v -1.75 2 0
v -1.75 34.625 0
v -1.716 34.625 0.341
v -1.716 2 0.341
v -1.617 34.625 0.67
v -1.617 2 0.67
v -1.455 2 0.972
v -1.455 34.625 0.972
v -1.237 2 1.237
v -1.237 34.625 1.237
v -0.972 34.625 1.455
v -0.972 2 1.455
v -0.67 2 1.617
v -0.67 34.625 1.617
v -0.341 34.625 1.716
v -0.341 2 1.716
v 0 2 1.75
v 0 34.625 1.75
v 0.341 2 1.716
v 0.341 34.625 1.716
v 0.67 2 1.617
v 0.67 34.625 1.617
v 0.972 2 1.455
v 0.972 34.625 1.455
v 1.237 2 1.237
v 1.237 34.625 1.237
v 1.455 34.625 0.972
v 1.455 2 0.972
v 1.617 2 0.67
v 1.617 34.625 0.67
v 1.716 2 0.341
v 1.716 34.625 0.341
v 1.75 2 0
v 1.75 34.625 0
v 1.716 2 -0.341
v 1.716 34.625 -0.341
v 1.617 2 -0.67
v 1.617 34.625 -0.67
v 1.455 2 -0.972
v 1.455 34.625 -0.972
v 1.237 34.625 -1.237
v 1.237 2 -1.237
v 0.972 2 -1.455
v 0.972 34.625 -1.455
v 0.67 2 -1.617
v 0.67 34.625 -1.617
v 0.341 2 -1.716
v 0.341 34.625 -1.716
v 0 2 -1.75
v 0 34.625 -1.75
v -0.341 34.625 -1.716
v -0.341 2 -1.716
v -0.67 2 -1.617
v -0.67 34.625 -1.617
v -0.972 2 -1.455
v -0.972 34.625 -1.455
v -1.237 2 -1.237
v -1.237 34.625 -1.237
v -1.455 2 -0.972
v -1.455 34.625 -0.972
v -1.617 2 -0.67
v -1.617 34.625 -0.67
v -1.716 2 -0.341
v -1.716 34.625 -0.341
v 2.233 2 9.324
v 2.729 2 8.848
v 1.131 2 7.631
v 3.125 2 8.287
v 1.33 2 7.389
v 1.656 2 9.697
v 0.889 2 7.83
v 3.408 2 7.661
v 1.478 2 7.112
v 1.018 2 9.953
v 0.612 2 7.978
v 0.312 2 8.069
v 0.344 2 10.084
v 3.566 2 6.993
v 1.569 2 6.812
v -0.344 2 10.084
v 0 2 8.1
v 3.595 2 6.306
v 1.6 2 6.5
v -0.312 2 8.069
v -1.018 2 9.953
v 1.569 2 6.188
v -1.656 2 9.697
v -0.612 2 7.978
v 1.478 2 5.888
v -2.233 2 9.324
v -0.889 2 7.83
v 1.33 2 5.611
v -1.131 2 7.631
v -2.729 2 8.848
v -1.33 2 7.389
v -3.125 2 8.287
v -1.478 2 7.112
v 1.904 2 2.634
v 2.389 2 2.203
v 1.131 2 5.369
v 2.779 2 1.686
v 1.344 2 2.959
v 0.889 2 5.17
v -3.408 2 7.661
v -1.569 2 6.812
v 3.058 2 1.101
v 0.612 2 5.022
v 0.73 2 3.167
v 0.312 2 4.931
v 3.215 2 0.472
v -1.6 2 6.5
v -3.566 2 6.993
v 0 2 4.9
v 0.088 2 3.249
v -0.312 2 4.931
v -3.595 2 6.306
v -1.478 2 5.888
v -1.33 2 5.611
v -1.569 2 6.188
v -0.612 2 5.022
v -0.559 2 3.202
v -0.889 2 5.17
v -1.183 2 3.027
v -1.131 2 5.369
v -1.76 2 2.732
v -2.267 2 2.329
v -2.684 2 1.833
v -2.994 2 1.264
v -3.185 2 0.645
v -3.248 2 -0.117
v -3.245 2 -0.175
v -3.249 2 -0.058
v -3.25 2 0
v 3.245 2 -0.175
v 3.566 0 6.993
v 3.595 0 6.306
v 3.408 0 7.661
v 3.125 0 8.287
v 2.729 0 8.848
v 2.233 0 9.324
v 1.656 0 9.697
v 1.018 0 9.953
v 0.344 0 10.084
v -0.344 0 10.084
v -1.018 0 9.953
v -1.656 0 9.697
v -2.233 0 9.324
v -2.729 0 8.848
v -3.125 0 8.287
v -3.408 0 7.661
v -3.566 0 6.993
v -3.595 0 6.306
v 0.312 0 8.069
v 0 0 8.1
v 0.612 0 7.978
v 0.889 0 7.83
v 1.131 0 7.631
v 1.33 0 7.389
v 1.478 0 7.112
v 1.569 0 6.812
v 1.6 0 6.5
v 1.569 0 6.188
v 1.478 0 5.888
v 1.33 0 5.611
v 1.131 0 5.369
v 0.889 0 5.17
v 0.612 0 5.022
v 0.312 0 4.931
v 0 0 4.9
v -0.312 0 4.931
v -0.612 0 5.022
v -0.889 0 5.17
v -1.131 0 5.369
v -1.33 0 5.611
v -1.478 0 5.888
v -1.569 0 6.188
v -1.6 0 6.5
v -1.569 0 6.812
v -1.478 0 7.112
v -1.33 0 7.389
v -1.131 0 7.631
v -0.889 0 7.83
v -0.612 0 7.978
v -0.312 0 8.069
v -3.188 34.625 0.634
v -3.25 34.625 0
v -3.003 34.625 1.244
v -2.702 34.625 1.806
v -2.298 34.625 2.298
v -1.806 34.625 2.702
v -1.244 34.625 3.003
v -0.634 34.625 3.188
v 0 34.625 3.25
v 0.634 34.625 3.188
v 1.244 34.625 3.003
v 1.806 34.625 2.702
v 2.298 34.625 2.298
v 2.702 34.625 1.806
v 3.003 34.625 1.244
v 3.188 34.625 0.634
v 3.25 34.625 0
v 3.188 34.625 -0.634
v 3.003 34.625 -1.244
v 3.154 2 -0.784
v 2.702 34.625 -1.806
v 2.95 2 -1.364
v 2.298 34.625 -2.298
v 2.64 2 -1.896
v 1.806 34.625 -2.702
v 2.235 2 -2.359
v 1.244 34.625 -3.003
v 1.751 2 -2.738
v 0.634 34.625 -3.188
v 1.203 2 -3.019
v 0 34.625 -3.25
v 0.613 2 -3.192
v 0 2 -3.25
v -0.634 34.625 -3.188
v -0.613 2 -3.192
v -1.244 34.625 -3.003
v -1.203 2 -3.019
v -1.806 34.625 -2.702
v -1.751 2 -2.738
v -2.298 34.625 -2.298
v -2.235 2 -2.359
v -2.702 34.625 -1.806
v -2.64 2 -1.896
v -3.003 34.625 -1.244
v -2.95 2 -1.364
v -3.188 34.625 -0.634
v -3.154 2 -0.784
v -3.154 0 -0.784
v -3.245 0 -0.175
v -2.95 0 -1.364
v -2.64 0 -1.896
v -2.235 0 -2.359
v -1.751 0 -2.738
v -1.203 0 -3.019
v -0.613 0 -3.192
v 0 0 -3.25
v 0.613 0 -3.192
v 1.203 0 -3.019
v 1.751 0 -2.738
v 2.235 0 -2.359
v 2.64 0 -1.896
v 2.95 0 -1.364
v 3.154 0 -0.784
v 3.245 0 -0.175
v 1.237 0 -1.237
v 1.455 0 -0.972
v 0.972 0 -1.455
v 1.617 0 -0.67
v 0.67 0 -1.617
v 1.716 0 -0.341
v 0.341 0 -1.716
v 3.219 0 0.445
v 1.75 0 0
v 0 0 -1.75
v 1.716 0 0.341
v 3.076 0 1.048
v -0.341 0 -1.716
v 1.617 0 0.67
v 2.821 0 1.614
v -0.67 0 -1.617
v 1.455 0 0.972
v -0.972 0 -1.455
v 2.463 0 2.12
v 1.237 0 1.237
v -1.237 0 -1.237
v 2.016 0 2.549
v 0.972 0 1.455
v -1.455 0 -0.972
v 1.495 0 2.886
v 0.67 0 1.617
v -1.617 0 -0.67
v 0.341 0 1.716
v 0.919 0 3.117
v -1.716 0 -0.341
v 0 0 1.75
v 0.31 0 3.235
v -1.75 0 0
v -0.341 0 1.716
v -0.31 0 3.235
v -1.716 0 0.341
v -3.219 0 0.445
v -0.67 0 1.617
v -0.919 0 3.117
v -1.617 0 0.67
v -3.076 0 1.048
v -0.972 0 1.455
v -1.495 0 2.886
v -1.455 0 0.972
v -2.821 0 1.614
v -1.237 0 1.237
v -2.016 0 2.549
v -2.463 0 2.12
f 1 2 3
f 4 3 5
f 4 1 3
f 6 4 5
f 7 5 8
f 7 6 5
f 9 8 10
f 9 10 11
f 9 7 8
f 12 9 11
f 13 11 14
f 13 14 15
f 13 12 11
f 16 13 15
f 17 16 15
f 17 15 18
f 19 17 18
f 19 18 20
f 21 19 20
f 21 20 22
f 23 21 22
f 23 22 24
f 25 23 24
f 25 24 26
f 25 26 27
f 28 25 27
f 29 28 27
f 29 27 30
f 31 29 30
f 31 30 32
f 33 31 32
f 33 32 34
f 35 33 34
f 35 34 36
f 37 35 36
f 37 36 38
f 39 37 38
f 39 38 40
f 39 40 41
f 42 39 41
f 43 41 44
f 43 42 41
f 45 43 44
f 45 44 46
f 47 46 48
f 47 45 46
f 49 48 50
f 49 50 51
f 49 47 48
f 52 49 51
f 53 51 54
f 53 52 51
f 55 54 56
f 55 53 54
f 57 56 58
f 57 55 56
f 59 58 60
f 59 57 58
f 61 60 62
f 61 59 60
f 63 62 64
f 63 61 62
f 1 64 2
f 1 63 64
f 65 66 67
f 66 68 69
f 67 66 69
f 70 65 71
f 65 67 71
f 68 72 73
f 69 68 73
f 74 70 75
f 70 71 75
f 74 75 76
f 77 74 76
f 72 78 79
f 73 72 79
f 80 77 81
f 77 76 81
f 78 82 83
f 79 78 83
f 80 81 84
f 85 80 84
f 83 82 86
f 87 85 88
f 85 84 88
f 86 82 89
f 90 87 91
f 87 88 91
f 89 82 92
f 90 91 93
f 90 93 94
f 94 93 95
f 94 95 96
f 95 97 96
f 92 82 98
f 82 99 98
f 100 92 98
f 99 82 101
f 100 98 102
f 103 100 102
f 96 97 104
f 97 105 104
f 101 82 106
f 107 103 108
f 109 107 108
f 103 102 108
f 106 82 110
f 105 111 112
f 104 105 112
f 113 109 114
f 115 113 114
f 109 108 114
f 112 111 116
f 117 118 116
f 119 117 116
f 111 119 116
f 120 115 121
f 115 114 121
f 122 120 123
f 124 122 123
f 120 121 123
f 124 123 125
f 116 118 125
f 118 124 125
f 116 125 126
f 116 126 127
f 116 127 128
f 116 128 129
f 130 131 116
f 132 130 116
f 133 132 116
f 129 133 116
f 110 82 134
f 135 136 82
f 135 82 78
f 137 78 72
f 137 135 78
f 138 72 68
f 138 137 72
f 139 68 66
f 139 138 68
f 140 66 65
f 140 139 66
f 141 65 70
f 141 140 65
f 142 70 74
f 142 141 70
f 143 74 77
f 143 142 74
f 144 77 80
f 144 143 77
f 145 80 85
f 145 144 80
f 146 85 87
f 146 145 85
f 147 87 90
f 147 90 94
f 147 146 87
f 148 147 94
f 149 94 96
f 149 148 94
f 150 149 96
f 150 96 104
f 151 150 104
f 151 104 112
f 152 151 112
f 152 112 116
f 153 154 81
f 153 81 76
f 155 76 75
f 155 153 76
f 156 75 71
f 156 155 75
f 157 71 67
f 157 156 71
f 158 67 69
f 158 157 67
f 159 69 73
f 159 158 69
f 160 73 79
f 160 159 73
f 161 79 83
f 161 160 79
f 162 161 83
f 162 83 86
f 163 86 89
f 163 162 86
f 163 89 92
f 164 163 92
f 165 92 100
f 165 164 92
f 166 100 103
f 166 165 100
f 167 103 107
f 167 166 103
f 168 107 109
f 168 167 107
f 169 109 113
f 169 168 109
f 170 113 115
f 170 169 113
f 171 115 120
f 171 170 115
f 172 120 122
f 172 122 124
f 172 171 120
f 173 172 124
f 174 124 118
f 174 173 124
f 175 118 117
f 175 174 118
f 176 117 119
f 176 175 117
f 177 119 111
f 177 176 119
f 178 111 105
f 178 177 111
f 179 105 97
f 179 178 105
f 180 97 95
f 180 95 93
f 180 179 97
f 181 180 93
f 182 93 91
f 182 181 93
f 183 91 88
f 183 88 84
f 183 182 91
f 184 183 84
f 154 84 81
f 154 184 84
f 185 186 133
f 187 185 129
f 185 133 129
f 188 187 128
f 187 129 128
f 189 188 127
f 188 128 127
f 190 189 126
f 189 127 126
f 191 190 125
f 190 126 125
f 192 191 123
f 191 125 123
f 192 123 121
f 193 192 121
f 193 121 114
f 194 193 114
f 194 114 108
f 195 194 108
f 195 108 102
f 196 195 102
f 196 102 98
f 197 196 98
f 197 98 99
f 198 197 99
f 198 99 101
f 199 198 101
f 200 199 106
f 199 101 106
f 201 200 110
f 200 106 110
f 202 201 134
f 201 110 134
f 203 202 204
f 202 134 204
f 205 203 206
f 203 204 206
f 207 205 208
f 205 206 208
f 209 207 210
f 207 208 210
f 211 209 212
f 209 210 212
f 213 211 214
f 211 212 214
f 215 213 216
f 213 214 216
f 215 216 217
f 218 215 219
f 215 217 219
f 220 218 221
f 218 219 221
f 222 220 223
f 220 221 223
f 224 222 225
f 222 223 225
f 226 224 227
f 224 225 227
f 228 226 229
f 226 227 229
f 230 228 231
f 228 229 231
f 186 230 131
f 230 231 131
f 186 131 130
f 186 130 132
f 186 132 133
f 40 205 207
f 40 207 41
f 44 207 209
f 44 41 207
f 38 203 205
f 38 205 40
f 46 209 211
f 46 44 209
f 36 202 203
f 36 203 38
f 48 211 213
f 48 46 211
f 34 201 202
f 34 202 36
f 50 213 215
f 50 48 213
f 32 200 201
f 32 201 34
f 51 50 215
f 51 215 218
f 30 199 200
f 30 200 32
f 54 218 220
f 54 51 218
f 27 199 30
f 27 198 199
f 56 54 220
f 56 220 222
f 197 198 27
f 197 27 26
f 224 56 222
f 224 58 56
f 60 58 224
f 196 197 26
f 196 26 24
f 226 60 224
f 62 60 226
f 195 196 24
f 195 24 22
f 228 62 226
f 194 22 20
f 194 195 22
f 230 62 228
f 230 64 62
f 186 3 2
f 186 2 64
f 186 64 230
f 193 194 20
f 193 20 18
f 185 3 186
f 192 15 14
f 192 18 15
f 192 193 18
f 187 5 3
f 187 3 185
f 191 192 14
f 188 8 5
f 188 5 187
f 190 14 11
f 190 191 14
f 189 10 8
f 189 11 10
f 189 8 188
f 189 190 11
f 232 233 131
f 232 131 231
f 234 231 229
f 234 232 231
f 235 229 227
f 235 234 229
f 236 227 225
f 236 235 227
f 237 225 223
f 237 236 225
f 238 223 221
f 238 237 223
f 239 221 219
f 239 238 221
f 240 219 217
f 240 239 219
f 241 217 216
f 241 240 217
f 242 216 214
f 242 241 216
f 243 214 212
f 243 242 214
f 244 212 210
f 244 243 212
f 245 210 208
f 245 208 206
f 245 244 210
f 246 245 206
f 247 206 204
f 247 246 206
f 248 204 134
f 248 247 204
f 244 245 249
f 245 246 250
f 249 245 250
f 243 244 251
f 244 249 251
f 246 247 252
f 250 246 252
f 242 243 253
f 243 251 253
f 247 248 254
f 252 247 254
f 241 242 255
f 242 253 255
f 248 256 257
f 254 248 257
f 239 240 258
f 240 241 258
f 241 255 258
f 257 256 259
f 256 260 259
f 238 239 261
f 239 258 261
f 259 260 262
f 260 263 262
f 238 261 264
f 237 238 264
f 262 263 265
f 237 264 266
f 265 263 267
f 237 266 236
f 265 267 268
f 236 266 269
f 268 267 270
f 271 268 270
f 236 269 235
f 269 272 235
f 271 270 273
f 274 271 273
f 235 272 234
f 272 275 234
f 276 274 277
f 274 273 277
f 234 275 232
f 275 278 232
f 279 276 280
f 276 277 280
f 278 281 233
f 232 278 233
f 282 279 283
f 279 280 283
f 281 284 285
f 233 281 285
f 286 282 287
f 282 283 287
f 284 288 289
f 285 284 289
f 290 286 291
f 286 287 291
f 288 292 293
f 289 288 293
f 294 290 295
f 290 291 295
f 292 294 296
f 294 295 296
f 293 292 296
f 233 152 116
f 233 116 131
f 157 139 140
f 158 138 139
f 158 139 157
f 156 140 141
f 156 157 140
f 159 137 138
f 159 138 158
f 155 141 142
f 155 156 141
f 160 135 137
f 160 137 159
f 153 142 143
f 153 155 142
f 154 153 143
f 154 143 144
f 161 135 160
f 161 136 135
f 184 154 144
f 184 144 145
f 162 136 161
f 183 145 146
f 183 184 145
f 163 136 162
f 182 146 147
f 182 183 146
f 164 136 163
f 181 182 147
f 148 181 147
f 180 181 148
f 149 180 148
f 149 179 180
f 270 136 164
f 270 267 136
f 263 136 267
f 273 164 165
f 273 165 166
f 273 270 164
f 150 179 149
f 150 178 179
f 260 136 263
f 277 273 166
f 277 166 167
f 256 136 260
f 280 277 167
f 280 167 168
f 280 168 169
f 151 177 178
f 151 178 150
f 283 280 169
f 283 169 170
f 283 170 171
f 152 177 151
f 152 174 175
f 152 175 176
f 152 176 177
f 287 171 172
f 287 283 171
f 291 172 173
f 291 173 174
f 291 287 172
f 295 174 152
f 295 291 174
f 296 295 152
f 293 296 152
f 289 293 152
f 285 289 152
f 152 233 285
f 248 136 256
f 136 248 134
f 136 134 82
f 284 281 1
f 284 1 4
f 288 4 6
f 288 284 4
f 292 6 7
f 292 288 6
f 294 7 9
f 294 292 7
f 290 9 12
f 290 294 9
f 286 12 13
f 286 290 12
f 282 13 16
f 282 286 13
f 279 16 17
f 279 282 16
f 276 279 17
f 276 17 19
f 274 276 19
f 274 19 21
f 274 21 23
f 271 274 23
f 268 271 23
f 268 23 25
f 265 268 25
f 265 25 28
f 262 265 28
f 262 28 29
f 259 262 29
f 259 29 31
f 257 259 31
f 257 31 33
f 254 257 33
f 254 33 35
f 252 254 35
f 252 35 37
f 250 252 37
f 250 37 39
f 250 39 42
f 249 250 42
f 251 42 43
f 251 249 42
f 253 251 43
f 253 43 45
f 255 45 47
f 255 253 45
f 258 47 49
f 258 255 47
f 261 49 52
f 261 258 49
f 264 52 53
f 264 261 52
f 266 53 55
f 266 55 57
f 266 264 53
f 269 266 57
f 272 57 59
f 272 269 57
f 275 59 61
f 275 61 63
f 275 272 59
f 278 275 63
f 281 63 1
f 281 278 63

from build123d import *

# Parameters (mm, degrees)
SKETCH1_R           = 3.25
SKETCH1_R_2         = 1.75
BOSS_EXTRUDE1_DEPTH = 34.625
SKETCH2_R           = 1.75
SKETCH2_R_2         = 1.6
BOSS_EXTRUDE2_DEPTH = 2


with BuildPart() as part:
    # Sketch1 → Boss-Extrude1 (new body)
    with BuildSketch(Plane(origin=(0, 0, 0), x_dir=(1, 0, 0), z_dir=(0, 1, 0))):
        with Locations(Location((0, 0, 0), (0, 0, 180))):
            Circle(SKETCH1_R)
        with Locations(Location((0, 0, 0), (0, 0, 180))):
            Circle(SKETCH1_R_2, mode=Mode.SUBTRACT)
    extrude(amount=BOSS_EXTRUDE1_DEPTH)

    # Sketch2 → Boss-Extrude2 (add)
    with BuildSketch(Plane(origin=(0, 0, 0), x_dir=(1, 0, 0), z_dir=(0, 1, 0))):
        with BuildLine():
            Line((-3.594777277, -6.306153846), (-3.245285041, 0.175))
            ThreePointArc((-3.245285041, 0.175), (0, 3.25), (3.245285041, 0.175))
            Line((3.245285041, 0.175), (3.594777277, -6.306153846))
            ThreePointArc((3.594777277, -6.306153846), (0, -10.1), (-3.594777277, -6.306153846))
        make_face()
        with Locations(Location((0, 0, 0), (0, 0, 180))):
            Circle(SKETCH2_R, mode=Mode.SUBTRACT)
        with Locations(Location((0, -6.5, 0), (0, 0, 270))):
            Circle(SKETCH2_R_2, mode=Mode.SUBTRACT)
    extrude(amount=BOSS_EXTRUDE2_DEPTH)


solid = part.part
